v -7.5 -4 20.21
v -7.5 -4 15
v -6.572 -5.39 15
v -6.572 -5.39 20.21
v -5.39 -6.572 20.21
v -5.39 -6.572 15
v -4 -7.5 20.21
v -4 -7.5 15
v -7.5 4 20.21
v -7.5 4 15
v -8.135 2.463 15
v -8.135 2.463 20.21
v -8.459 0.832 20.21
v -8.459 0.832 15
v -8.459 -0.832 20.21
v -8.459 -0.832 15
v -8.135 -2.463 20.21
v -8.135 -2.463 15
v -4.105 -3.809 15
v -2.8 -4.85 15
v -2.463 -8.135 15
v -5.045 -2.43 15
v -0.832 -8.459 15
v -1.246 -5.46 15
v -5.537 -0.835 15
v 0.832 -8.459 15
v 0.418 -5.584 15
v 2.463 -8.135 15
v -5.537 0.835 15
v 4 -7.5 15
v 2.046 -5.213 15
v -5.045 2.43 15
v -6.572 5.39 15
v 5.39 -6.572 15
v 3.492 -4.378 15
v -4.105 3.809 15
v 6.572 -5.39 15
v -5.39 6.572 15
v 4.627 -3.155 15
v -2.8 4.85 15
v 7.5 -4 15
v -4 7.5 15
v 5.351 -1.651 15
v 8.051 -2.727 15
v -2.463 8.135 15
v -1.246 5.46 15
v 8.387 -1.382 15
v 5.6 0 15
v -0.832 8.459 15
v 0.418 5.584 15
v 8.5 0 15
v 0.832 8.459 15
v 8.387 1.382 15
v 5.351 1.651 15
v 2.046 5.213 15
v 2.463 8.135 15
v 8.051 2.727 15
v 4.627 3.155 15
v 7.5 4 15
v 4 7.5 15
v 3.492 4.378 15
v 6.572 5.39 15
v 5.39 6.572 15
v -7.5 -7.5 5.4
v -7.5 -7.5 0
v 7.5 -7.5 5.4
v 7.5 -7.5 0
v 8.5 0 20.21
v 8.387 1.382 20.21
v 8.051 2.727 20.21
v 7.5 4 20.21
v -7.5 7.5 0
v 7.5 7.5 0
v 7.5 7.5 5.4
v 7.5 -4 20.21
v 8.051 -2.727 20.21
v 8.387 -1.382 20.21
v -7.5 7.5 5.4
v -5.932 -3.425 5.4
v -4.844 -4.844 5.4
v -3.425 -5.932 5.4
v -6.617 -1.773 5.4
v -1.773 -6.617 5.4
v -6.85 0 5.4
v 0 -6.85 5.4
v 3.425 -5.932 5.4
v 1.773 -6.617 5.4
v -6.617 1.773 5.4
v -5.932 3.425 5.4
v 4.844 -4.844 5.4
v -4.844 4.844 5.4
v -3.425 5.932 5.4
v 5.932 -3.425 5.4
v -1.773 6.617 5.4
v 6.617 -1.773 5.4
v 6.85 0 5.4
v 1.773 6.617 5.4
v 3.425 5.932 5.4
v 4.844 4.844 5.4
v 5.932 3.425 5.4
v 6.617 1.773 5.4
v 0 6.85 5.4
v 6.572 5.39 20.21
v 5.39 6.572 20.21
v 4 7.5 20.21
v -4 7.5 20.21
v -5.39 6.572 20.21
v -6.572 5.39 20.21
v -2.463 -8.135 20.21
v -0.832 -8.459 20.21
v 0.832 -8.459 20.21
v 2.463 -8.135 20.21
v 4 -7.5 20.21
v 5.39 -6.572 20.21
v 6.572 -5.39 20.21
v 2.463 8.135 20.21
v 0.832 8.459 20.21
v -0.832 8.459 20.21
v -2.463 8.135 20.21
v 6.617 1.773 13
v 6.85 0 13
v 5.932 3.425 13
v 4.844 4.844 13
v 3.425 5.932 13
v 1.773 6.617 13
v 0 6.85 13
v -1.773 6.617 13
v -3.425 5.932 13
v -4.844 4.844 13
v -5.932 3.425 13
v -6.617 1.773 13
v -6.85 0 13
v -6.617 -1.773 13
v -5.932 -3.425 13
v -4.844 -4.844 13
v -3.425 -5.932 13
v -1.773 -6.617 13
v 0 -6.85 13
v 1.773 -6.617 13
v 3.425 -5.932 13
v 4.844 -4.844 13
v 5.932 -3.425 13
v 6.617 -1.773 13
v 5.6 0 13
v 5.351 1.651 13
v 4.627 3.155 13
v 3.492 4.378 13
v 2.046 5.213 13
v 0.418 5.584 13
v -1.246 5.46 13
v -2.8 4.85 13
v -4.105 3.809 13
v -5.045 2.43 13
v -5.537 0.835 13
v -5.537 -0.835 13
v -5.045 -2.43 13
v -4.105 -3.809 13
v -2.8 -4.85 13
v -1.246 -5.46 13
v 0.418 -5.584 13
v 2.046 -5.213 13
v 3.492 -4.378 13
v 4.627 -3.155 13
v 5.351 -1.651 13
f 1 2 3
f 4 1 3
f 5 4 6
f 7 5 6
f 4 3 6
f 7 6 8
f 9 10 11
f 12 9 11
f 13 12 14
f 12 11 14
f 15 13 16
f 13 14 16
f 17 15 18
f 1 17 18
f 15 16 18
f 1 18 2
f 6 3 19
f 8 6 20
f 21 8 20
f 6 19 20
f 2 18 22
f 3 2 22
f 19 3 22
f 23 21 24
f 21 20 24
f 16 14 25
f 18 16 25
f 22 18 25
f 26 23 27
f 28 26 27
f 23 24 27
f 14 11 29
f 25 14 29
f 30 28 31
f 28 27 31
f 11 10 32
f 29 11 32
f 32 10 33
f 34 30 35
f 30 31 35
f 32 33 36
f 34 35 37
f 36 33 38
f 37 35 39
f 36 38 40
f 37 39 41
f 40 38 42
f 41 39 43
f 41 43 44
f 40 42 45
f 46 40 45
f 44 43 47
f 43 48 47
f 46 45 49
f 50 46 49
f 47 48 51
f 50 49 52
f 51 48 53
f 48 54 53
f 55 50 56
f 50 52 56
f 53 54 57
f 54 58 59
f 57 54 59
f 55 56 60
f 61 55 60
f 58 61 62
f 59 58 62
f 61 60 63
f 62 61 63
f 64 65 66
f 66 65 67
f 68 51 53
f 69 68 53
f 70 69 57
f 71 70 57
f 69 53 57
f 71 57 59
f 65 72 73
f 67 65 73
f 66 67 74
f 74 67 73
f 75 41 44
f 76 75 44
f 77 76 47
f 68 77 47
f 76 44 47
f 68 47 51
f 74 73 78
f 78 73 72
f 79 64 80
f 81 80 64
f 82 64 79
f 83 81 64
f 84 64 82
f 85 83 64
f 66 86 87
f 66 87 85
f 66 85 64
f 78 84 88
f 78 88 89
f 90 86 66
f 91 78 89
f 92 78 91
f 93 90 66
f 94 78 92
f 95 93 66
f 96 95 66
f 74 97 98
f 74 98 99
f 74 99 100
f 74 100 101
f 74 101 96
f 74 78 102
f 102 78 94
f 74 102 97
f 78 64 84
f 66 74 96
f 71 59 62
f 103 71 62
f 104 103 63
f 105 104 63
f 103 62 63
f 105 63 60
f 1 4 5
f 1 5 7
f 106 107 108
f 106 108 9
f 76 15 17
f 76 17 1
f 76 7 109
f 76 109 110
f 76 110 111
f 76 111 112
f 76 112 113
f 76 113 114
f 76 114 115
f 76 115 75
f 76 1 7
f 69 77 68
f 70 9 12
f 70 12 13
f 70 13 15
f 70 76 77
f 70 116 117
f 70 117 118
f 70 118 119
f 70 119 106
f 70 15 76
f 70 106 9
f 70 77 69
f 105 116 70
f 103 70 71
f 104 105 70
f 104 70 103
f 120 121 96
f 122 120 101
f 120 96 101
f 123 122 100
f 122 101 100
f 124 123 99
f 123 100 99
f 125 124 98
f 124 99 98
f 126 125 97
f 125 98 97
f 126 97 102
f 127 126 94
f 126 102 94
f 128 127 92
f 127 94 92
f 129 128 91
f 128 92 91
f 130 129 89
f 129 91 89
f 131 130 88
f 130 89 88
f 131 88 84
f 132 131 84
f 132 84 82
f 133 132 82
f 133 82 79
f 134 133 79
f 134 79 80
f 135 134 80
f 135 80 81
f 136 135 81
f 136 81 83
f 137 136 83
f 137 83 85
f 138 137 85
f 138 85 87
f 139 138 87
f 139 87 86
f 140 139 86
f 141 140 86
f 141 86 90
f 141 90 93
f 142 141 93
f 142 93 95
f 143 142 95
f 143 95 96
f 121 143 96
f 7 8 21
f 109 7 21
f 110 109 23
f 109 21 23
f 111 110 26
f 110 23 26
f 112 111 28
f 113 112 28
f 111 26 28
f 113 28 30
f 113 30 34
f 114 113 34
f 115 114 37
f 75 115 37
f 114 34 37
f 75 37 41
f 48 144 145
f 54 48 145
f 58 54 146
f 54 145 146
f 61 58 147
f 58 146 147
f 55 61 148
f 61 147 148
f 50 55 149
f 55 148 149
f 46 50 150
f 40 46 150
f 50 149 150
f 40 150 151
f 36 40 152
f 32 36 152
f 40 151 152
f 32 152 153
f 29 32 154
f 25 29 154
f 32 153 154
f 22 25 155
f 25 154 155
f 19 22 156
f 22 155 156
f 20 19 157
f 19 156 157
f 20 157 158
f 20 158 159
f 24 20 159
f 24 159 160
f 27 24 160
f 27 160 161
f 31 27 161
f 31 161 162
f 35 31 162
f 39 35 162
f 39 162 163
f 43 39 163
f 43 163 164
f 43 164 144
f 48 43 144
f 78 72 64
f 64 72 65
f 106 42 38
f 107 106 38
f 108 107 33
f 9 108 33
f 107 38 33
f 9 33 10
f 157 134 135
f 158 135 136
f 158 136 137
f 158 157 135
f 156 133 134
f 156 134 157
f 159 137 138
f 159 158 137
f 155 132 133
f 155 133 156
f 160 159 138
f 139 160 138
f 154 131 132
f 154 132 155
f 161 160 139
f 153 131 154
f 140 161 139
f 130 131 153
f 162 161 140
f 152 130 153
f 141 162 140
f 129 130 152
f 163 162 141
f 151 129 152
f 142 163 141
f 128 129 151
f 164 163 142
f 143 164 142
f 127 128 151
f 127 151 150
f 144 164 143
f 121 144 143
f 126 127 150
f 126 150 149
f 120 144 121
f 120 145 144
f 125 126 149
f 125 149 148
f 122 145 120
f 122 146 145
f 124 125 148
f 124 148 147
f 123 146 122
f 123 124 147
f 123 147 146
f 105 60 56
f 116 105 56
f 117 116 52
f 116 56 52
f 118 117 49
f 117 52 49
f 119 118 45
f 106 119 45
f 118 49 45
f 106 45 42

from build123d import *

# Parameters (mm, degrees)
F0_R     = 6.85
F0_R_2   = 5.6
F1_DEPTH = 5.4
F2_DEPTH = 13
F3_DEPTH = 15
F4_START = 15
F4_DEPTH = 5.21


with BuildPart() as f1:
    # F0 (on Top) → F1 (new body)
    with BuildSketch(Plane.XY):
        with BuildLine():
            ThreePointArc((4, 7.5), (6.0104076401, 6.0104076401), (7.5, 4))
            Line((7.5, 4), (7.5, 7.5))
            Line((7.5, 7.5), (4, 7.5))
        make_face()
        with BuildLine():
            Line((7.5, -4), (7.5, 4))
            ThreePointArc((7.5, 4), (6.0104076401, 6.0104076401), (4, 7.5))
            Line((4, 7.5), (-4, 7.5))
            ThreePointArc((-4, 7.5), (-6.0104076401, 6.0104076401), (-7.5, 4))
            Line((-7.5, 4), (-7.5, -4))
            ThreePointArc((-7.5, -4), (-6.0104076401, -6.0104076401), (-4, -7.5))
            Line((-4, -7.5), (4, -7.5))
            ThreePointArc((4, -7.5), (6.0104076401, -6.0104076401), (7.5, -4))
        make_face()
        Circle(F0_R, mode=Mode.SUBTRACT)
        Circle(F0_R)
        Circle(F0_R_2, mode=Mode.SUBTRACT)
        Circle(F0_R_2)
        with BuildLine():
            ThreePointArc((-7.5, 4), (-6.0104076401, 6.0104076401), (-4, 7.5))
            Line((-4, 7.5), (-7.5, 7.5))
            Line((-7.5, 7.5), (-7.5, 4))
        make_face()
        with BuildLine():
            Line((-7.5, -7.5), (-4, -7.5))
            ThreePointArc((-4, -7.5), (-6.0104076401, -6.0104076401), (-7.5, -4))
            Line((-7.5, -4), (-7.5, -7.5))
        make_face()
        with BuildLine():
            Line((7.5, -7.5), (7.5, -4))
            ThreePointArc((7.5, -4), (6.0104076401, -6.0104076401), (4, -7.5))
            Line((4, -7.5), (7.5, -7.5))
        make_face()
    extrude(amount=F1_DEPTH)

    # F0 (on Top) → F2 (join)
    with BuildSketch(Plane.XY):
        Circle(F0_R)
        Circle(F0_R_2, mode=Mode.SUBTRACT)
        Circle(F0_R_2)
    extrude(amount=F2_DEPTH)

    # F0 (on Top) → F3 (join)
    with BuildSketch(Plane.XY):
        Circle(F0_R_2)
    extrude(amount=F3_DEPTH)

    # F0 (on Top) → F4 (join)
    with BuildSketch(Plane.XY.offset(F4_START)):
        with BuildLine():
            Line((-7.5, -4), (-7.5, 4))
            ThreePointArc((-7.5, 4), (-8.5, 0), (-7.5, -4))
        make_face()
        with BuildLine():
            Line((7.5, -4), (7.5, 4))
            ThreePointArc((7.5, 4), (6.0104076401, 6.0104076401), (4, 7.5))
            Line((4, 7.5), (-4, 7.5))
            ThreePointArc((-4, 7.5), (-6.0104076401, 6.0104076401), (-7.5, 4))
            Line((-7.5, 4), (-7.5, -4))
            ThreePointArc((-7.5, -4), (-6.0104076401, -6.0104076401), (-4, -7.5))
            Line((-4, -7.5), (4, -7.5))
            ThreePointArc((4, -7.5), (6.0104076401, -6.0104076401), (7.5, -4))
        make_face()
        Circle(F0_R, mode=Mode.SUBTRACT)
        Circle(F0_R)
        Circle(F0_R_2, mode=Mode.SUBTRACT)
        Circle(F0_R_2)
        with BuildLine():
            ThreePointArc((-4, -7.5), (0, -8.5), (4, -7.5))
            Line((4, -7.5), (-4, -7.5))
        make_face()
        with BuildLine():
            ThreePointArc((7.5, -4), (8.2462112512, -2.0615528128), (8.5, 0))
            ThreePointArc((8.5, 0), (8.2462112512, 2.0615528128), (7.5, 4))
            Line((7.5, 4), (7.5, -4))
        make_face()
        with BuildLine():
            Line((-4, 7.5), (4, 7.5))
            ThreePointArc((4, 7.5), (0, 8.5), (-4, 7.5))
        make_face()
    extrude(amount=F4_DEPTH)


solid = f1.part
